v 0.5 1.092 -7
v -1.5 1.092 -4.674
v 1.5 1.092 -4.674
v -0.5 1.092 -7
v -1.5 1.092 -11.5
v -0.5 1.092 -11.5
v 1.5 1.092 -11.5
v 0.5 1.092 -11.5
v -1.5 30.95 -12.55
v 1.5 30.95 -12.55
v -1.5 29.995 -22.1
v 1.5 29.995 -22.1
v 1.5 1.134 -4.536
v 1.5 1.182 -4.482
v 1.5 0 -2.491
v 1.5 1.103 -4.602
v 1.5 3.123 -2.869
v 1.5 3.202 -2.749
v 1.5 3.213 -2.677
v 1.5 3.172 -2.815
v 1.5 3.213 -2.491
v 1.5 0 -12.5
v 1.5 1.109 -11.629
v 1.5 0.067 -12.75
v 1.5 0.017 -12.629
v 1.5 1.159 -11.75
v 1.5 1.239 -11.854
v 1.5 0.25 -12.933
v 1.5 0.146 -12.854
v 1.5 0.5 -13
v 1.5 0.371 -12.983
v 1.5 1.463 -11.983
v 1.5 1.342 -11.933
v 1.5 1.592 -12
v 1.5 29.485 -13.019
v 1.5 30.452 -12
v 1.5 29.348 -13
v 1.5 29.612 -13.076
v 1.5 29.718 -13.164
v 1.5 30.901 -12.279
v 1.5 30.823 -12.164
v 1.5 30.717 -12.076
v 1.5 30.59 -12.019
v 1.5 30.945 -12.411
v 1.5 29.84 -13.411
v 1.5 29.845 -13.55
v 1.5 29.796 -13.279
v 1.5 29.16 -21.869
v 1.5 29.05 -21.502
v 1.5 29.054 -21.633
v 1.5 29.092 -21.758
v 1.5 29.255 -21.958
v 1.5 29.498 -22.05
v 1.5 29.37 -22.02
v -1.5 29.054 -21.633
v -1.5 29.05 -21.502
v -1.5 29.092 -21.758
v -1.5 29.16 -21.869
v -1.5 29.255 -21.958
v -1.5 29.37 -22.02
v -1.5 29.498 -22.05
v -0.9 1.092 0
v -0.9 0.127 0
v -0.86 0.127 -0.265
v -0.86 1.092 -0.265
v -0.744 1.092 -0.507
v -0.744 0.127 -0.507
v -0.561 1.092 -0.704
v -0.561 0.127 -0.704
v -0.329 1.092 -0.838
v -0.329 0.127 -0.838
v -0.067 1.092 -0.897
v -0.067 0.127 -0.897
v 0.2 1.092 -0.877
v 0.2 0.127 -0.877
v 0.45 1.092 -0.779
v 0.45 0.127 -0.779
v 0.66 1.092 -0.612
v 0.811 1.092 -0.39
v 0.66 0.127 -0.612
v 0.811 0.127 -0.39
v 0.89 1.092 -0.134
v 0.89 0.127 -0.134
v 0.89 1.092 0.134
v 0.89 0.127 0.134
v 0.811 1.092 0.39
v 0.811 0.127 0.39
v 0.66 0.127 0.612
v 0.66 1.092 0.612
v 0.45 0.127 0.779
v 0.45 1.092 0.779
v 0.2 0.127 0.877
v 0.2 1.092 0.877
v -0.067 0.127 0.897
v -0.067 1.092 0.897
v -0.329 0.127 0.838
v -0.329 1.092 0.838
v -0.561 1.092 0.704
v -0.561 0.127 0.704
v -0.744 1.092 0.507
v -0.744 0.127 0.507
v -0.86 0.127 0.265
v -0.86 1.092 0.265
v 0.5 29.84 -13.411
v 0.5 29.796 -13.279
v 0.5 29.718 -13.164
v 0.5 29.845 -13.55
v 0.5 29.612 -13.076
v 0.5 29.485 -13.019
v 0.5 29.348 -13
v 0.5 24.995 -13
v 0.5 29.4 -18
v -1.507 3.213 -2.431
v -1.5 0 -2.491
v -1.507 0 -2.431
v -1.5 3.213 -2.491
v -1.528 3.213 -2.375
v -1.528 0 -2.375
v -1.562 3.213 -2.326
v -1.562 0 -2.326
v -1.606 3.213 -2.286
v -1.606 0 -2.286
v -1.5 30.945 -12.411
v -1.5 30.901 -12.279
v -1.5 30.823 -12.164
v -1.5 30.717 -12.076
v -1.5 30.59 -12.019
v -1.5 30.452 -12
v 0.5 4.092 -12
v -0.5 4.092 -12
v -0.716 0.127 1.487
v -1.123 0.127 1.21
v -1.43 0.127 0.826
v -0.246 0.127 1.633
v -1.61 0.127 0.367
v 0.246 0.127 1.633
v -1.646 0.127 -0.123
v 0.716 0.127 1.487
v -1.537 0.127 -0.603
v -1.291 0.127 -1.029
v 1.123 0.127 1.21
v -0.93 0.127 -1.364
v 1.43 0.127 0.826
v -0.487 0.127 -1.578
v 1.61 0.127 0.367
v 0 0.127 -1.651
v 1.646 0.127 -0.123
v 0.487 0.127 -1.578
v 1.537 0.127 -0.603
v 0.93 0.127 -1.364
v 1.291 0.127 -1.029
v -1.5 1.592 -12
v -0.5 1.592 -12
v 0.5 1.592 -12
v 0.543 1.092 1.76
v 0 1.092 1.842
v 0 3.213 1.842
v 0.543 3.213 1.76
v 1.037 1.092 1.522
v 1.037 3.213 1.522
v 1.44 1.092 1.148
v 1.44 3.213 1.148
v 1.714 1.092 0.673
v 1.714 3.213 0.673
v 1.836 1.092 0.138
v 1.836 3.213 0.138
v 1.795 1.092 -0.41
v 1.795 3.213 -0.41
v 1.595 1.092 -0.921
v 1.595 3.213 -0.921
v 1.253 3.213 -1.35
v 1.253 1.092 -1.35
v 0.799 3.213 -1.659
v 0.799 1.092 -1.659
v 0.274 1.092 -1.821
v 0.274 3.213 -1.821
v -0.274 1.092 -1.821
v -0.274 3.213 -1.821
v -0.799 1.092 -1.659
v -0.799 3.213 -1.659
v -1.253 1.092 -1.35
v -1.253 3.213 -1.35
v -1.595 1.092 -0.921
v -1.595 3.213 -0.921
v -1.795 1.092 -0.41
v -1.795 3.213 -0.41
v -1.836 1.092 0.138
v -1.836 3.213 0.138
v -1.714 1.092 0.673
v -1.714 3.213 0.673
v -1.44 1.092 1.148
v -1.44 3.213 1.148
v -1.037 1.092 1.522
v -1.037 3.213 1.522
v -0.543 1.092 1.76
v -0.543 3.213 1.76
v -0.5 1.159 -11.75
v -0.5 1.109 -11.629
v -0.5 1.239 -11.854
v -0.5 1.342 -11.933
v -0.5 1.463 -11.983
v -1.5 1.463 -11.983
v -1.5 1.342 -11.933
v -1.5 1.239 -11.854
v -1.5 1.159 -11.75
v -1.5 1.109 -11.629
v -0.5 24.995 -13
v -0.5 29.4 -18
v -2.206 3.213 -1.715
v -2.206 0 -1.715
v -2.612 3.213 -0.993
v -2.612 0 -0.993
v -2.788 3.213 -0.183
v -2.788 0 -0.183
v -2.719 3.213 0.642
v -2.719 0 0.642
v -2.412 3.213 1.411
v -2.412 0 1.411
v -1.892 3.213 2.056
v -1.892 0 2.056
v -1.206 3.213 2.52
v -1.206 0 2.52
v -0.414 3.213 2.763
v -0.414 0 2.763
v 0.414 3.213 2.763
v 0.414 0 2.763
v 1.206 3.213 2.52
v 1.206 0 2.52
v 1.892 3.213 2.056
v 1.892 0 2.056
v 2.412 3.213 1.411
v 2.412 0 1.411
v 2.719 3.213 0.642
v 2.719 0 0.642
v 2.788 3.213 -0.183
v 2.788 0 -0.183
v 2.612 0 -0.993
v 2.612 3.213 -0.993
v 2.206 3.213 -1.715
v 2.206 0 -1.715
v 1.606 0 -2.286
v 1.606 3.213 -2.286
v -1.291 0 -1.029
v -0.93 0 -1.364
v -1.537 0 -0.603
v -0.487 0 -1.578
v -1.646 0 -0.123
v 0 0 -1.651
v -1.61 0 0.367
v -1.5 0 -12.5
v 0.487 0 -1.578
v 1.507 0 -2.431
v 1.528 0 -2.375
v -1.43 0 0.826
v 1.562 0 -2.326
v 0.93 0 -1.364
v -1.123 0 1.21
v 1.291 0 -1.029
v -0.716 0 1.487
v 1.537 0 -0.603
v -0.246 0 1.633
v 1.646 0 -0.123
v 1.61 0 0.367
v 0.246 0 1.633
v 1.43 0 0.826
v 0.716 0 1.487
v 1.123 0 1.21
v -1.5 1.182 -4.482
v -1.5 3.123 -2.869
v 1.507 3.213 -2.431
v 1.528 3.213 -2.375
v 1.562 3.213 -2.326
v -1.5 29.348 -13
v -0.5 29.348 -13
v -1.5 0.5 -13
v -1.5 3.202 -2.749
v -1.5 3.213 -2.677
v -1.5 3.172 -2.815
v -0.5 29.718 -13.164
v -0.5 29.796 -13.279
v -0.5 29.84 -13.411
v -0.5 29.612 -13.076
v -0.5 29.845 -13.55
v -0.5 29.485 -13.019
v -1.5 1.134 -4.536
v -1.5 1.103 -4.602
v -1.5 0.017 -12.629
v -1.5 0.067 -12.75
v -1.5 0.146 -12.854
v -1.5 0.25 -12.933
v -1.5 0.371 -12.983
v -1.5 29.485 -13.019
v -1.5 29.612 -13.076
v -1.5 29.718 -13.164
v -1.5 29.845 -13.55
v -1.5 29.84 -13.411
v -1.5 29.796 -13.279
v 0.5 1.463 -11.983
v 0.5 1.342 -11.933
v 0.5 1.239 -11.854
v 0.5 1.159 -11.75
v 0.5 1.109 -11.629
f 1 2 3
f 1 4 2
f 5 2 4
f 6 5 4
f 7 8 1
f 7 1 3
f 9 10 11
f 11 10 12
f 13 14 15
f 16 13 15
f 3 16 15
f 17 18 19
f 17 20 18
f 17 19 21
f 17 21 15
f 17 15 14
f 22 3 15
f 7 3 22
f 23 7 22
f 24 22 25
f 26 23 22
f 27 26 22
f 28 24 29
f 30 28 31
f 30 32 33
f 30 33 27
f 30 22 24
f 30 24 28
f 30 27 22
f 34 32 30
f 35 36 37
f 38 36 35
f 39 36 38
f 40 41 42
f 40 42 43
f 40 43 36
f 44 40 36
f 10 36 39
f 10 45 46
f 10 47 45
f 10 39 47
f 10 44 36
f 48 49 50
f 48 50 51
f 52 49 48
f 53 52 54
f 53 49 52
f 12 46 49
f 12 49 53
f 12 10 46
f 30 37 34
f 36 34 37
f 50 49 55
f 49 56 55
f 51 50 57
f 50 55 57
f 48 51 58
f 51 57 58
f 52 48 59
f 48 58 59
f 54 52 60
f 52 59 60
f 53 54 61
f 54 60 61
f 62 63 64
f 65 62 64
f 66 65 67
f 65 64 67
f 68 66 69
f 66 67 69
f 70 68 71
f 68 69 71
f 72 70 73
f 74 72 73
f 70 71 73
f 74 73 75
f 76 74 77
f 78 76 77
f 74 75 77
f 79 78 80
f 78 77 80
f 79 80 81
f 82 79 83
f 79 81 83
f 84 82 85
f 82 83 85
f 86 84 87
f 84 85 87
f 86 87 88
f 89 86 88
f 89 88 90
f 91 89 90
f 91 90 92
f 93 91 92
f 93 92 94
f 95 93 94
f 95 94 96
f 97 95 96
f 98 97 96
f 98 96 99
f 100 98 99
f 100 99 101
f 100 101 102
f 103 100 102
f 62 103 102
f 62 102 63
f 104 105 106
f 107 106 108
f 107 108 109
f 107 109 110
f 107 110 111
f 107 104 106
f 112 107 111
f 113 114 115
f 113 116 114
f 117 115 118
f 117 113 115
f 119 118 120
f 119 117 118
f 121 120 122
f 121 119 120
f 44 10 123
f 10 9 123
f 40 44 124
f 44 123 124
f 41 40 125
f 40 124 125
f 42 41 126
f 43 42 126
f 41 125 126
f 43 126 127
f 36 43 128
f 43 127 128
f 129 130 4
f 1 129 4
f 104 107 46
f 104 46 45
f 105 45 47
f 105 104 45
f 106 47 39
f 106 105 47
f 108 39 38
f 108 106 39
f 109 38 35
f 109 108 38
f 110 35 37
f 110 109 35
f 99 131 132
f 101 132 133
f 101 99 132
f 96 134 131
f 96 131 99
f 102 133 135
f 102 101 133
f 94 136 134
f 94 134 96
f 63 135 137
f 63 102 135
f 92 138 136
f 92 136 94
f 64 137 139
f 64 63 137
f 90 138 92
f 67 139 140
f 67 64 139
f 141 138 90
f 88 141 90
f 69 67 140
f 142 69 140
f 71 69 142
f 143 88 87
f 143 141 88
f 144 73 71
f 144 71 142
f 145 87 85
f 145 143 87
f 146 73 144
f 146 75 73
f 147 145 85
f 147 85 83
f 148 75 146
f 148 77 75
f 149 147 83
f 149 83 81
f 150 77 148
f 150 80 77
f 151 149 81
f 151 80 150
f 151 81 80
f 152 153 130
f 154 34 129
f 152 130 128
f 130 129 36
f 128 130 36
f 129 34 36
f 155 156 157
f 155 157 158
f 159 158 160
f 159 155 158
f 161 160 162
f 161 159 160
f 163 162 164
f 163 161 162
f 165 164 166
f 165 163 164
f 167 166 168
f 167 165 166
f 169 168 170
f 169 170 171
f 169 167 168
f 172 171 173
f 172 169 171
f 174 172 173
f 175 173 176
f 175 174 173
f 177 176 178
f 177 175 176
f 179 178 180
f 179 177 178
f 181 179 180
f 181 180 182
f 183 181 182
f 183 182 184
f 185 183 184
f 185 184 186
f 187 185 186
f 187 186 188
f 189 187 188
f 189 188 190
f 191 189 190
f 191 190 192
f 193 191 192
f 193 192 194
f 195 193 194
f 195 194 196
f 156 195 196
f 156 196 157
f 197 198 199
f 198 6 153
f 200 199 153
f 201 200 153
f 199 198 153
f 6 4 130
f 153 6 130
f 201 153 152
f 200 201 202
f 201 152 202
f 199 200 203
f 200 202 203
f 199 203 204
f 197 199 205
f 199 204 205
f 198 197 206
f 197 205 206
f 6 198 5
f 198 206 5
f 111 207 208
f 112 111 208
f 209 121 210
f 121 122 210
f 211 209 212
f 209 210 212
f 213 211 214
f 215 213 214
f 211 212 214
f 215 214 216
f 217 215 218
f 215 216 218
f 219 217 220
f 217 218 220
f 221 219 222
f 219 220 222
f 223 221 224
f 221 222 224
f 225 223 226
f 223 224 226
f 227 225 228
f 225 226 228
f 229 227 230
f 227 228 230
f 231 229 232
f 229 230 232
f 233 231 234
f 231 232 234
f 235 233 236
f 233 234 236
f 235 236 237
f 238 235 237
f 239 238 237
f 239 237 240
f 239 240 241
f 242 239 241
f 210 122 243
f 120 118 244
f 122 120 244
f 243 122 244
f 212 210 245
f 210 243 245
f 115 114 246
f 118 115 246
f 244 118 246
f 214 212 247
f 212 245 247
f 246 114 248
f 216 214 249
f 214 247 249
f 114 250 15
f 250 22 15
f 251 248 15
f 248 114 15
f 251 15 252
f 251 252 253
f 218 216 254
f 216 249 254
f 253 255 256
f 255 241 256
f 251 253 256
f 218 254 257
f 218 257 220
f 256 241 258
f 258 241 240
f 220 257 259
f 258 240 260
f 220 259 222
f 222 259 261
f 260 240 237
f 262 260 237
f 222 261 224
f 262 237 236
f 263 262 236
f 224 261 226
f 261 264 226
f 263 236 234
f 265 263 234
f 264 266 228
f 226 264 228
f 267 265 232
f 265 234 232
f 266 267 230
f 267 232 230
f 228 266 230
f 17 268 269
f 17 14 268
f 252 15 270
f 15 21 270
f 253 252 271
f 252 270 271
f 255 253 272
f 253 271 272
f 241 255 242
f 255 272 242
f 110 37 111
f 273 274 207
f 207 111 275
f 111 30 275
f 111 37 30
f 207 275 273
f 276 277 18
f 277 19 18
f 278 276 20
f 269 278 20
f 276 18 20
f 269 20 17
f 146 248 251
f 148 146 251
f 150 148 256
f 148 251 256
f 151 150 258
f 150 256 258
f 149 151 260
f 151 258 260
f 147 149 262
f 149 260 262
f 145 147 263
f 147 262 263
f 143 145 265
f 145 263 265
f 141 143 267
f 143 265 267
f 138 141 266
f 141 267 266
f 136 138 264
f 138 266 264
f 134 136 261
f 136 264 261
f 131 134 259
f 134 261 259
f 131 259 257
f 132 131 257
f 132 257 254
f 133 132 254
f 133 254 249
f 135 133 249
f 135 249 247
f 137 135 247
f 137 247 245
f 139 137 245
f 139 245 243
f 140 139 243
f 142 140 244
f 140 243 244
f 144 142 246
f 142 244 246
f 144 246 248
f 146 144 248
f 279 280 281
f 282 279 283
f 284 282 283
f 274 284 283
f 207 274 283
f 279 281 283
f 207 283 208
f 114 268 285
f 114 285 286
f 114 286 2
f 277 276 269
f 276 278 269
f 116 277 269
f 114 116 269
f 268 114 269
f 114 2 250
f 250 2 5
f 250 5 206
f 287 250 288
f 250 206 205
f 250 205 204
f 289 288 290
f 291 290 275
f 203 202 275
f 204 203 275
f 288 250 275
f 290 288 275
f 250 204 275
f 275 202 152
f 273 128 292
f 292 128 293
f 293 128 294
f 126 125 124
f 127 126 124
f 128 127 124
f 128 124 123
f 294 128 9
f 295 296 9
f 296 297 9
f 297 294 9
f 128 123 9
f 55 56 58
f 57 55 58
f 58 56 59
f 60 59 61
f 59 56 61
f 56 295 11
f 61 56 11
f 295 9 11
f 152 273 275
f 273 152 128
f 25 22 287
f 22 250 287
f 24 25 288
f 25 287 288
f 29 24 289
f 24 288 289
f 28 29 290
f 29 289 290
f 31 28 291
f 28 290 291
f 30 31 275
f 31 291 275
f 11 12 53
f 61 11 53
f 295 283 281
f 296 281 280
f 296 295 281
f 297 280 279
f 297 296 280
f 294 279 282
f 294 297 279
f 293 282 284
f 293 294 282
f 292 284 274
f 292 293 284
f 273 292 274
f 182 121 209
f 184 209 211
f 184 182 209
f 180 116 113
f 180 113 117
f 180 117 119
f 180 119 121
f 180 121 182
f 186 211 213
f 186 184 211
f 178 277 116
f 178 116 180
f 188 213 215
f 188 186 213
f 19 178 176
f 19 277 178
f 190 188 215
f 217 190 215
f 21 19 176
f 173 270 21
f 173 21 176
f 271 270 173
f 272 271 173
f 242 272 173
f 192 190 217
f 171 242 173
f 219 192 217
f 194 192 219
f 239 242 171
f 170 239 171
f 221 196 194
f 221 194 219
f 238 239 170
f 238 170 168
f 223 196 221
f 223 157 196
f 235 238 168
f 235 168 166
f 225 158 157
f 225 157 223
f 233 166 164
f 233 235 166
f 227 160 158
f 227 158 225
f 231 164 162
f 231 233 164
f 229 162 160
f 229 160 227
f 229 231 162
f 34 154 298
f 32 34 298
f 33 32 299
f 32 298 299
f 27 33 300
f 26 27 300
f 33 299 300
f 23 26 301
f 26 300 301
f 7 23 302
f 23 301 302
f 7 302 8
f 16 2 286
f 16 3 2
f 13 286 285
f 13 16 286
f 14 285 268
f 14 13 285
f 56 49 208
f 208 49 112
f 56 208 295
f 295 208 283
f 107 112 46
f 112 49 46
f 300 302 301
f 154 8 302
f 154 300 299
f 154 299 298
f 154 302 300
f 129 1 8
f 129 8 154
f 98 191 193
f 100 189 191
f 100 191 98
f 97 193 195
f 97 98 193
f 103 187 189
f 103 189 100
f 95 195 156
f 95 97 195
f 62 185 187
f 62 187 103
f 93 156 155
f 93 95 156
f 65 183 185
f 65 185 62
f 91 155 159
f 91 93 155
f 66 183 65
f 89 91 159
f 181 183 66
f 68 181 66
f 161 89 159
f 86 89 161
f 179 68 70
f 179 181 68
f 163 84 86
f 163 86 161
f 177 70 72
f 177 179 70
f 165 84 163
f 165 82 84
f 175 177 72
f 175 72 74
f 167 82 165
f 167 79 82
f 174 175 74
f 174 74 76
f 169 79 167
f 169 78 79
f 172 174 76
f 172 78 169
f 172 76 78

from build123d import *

# Parameters (mm, degrees)
SKETCH1_R                  = 2.794
SKETCH1_R_2                = 1.8415
BOSS_EXTRUDE1_DEPTH        = 3.2131
BOSS_EXTRUDE2_DEPTH        = 1.0922
M1_6_CLEARANCE_HOLE1_D     = 1.8
M1_6_CLEARANCE_HOLE1_DEPTH = 7.25
M1_6_CLEARANCE_HOLE1_TIP   = 0.540774557
SKETCH4_R                  = 1.651
CUT_EXTRUDE2_DEPTH         = 0.127
SKETCH5_W                  = 3
SKETCH5_H                  = 1
BOSS_EXTRUDE3_DEPTH        = 30
BOSS_EXTRUDE4_DEPTH        = 3
FILLET1_R                  = 0.5
RIB1_START                 = -0.5
RIB1_DEPTH                 = 1
RIB3_START                 = -0.5
RIB3_DEPTH                 = 1
BOSS_EXTRUDE8_DEPTH        = 1.5
FILLET2_R                  = 0.25


# Read off the part's stored shape, not the designer's step: Rib1, Rib3
with BuildPart() as part:
    # Sketch1 → Boss-Extrude1 (new body)
    with BuildSketch(Plane(origin=(0, 0, 0), x_dir=(1, 0, 0), z_dir=(0, 1, 0))):
        with Locations(Location((0, 0, 0), (0, 0, 270))):
            Circle(SKETCH1_R)
        with Locations(Location((0, 0, 0), (0, 0, 270))):
            Circle(SKETCH1_R_2, mode=Mode.SUBTRACT)
    extrude(amount=BOSS_EXTRUDE1_DEPTH)

    # Sketch2 → Boss-Extrude2 (add)
    with BuildSketch(Plane(origin=(0, 0, 0), x_dir=(1, 0, 0), z_dir=(0, 1, 0))):
        with BuildLine():
            Line((-1.5, 6.604), (-1.5, 2.357209367))
            ThreePointArc((-1.5, 2.357209367), (0, -2.794), (1.5, 2.357209367))
            Line((1.5, 2.357209367), (1.5, 6.604))
            Line((1.5, 6.604), (1.5, 13))
            Line((1.5, 13), (-1.5, 13))
            Line((-1.5, 13), (-1.5, 6.604))
        make_face()
    extrude(amount=BOSS_EXTRUDE2_DEPTH)

    # M1.6 Clearance Hole1
    with Locations(Plane(origin=(0, 1.0922, 0), x_dir=(1, 0, 0), z_dir=(0, 1, 0))):
        with Locations((0, 0)):
            Hole(M1_6_CLEARANCE_HOLE1_D / 2, depth=M1_6_CLEARANCE_HOLE1_DEPTH)
            with Locations((0, 0, -(M1_6_CLEARANCE_HOLE1_DEPTH + M1_6_CLEARANCE_HOLE1_TIP / 2))):  # 118° drill point
                Cone(0, M1_6_CLEARANCE_HOLE1_D / 2, M1_6_CLEARANCE_HOLE1_TIP, mode=Mode.SUBTRACT)

    # Sketch4 → Cut-Extrude2 (cut)
    with BuildSketch(Plane.XZ):
        with Locations(Location((0, 0, 0), (0, 0, 270))):
            Circle(SKETCH4_R)
    extrude(amount=-CUT_EXTRUDE2_DEPTH, mode=Mode.SUBTRACT)

    # Sketch5 → Boss-Extrude3 (add)
    with BuildSketch(Plane.XZ):
        with Locations((0, -12.5)):
            Rectangle(SKETCH5_W, SKETCH5_H)
    extrude(amount=-BOSS_EXTRUDE3_DEPTH)

    # Sketch6 → Boss-Extrude4 (add)
    with BuildSketch(Plane(origin=(1.5, 0, 0), x_dir=(0, 0, -1), z_dir=(1, 0, 0))):
        Polygon((22, 29), (12, 30), (12, 31.004987562), (22.099503719, 29.99503719), align=None)
    extrude(amount=-BOSS_EXTRUDE4_DEPTH)

    # Fillet1
    fillet1_edges = [part.edges().sort_by_distance(p)[0] for p in [
        (0, 0, -13),
        (0, 1.0922, -12),
        (0, 29, -22),
        (0, 31.004987562, -12),
        (0, 29.9, -13),
    ]]
    fillet(fillet1_edges, radius=FILLET1_R)

    # Rib1 outline → Rib1 (add)
    with BuildSketch(Plane(origin=(0, 0, 0), x_dir=(0, 0, -1), z_dir=(1, 0, 0)).offset(RIB1_START)):
        with BuildLine():
            Line((12, 1.5922), (12, 4.0922))
            Line((12, 4.0922), (7, 1.0922))
            Line((7, 1.0922), (11.5, 1.0922))
            ThreePointArc((11.5, 1.0922), (11.853553391, 1.238646609), (12, 1.5922))
        make_face()
    extrude(amount=RIB1_DEPTH)

    # Rib3 outline → Rib3 (add)
    with BuildSketch(Plane(origin=(0, 0, 0), x_dir=(0, 0, -1), z_dir=(1, 0, 0)).offset(RIB3_START)):
        with BuildLine():
            Line((13, 24.99503719), (18, 29.4))
            Line((18, 29.4), (13.54975186, 29.845024814))
            ThreePointArc((13.54975186, 29.845024814), (13.16449734, 29.718232486), (13, 29.347506219))
            Line((13, 29.347506219), (13, 24.99503719))
        make_face()
    extrude(amount=RIB3_DEPTH)

    # Sketch11 → Boss-Extrude8 (add, symmetric)
    with BuildSketch(Plane(origin=(0, 0, 0), x_dir=(0, 0, -1), z_dir=(1, 0, 0))):
        Polygon((2.357209367, 1.0922), (4.557209367, 1.0922), (2.794, 3.2131), (2.357209367, 3.2131), align=None)
    extrude(amount=BOSS_EXTRUDE8_DEPTH, both=True)

    # Fillet2
    fillet2_edges = [part.edges().sort_by_distance(p)[0] for p in [
        (-1.5, 1.60655, -2.357209367),
        (1.5, 1.60655, -2.357209367),
        (0, 3.2131, -2.794),
        (0, 1.0922, -4.557209367),
    ]]
    fillet(fillet2_edges, radius=FILLET2_R)


solid = part.part
